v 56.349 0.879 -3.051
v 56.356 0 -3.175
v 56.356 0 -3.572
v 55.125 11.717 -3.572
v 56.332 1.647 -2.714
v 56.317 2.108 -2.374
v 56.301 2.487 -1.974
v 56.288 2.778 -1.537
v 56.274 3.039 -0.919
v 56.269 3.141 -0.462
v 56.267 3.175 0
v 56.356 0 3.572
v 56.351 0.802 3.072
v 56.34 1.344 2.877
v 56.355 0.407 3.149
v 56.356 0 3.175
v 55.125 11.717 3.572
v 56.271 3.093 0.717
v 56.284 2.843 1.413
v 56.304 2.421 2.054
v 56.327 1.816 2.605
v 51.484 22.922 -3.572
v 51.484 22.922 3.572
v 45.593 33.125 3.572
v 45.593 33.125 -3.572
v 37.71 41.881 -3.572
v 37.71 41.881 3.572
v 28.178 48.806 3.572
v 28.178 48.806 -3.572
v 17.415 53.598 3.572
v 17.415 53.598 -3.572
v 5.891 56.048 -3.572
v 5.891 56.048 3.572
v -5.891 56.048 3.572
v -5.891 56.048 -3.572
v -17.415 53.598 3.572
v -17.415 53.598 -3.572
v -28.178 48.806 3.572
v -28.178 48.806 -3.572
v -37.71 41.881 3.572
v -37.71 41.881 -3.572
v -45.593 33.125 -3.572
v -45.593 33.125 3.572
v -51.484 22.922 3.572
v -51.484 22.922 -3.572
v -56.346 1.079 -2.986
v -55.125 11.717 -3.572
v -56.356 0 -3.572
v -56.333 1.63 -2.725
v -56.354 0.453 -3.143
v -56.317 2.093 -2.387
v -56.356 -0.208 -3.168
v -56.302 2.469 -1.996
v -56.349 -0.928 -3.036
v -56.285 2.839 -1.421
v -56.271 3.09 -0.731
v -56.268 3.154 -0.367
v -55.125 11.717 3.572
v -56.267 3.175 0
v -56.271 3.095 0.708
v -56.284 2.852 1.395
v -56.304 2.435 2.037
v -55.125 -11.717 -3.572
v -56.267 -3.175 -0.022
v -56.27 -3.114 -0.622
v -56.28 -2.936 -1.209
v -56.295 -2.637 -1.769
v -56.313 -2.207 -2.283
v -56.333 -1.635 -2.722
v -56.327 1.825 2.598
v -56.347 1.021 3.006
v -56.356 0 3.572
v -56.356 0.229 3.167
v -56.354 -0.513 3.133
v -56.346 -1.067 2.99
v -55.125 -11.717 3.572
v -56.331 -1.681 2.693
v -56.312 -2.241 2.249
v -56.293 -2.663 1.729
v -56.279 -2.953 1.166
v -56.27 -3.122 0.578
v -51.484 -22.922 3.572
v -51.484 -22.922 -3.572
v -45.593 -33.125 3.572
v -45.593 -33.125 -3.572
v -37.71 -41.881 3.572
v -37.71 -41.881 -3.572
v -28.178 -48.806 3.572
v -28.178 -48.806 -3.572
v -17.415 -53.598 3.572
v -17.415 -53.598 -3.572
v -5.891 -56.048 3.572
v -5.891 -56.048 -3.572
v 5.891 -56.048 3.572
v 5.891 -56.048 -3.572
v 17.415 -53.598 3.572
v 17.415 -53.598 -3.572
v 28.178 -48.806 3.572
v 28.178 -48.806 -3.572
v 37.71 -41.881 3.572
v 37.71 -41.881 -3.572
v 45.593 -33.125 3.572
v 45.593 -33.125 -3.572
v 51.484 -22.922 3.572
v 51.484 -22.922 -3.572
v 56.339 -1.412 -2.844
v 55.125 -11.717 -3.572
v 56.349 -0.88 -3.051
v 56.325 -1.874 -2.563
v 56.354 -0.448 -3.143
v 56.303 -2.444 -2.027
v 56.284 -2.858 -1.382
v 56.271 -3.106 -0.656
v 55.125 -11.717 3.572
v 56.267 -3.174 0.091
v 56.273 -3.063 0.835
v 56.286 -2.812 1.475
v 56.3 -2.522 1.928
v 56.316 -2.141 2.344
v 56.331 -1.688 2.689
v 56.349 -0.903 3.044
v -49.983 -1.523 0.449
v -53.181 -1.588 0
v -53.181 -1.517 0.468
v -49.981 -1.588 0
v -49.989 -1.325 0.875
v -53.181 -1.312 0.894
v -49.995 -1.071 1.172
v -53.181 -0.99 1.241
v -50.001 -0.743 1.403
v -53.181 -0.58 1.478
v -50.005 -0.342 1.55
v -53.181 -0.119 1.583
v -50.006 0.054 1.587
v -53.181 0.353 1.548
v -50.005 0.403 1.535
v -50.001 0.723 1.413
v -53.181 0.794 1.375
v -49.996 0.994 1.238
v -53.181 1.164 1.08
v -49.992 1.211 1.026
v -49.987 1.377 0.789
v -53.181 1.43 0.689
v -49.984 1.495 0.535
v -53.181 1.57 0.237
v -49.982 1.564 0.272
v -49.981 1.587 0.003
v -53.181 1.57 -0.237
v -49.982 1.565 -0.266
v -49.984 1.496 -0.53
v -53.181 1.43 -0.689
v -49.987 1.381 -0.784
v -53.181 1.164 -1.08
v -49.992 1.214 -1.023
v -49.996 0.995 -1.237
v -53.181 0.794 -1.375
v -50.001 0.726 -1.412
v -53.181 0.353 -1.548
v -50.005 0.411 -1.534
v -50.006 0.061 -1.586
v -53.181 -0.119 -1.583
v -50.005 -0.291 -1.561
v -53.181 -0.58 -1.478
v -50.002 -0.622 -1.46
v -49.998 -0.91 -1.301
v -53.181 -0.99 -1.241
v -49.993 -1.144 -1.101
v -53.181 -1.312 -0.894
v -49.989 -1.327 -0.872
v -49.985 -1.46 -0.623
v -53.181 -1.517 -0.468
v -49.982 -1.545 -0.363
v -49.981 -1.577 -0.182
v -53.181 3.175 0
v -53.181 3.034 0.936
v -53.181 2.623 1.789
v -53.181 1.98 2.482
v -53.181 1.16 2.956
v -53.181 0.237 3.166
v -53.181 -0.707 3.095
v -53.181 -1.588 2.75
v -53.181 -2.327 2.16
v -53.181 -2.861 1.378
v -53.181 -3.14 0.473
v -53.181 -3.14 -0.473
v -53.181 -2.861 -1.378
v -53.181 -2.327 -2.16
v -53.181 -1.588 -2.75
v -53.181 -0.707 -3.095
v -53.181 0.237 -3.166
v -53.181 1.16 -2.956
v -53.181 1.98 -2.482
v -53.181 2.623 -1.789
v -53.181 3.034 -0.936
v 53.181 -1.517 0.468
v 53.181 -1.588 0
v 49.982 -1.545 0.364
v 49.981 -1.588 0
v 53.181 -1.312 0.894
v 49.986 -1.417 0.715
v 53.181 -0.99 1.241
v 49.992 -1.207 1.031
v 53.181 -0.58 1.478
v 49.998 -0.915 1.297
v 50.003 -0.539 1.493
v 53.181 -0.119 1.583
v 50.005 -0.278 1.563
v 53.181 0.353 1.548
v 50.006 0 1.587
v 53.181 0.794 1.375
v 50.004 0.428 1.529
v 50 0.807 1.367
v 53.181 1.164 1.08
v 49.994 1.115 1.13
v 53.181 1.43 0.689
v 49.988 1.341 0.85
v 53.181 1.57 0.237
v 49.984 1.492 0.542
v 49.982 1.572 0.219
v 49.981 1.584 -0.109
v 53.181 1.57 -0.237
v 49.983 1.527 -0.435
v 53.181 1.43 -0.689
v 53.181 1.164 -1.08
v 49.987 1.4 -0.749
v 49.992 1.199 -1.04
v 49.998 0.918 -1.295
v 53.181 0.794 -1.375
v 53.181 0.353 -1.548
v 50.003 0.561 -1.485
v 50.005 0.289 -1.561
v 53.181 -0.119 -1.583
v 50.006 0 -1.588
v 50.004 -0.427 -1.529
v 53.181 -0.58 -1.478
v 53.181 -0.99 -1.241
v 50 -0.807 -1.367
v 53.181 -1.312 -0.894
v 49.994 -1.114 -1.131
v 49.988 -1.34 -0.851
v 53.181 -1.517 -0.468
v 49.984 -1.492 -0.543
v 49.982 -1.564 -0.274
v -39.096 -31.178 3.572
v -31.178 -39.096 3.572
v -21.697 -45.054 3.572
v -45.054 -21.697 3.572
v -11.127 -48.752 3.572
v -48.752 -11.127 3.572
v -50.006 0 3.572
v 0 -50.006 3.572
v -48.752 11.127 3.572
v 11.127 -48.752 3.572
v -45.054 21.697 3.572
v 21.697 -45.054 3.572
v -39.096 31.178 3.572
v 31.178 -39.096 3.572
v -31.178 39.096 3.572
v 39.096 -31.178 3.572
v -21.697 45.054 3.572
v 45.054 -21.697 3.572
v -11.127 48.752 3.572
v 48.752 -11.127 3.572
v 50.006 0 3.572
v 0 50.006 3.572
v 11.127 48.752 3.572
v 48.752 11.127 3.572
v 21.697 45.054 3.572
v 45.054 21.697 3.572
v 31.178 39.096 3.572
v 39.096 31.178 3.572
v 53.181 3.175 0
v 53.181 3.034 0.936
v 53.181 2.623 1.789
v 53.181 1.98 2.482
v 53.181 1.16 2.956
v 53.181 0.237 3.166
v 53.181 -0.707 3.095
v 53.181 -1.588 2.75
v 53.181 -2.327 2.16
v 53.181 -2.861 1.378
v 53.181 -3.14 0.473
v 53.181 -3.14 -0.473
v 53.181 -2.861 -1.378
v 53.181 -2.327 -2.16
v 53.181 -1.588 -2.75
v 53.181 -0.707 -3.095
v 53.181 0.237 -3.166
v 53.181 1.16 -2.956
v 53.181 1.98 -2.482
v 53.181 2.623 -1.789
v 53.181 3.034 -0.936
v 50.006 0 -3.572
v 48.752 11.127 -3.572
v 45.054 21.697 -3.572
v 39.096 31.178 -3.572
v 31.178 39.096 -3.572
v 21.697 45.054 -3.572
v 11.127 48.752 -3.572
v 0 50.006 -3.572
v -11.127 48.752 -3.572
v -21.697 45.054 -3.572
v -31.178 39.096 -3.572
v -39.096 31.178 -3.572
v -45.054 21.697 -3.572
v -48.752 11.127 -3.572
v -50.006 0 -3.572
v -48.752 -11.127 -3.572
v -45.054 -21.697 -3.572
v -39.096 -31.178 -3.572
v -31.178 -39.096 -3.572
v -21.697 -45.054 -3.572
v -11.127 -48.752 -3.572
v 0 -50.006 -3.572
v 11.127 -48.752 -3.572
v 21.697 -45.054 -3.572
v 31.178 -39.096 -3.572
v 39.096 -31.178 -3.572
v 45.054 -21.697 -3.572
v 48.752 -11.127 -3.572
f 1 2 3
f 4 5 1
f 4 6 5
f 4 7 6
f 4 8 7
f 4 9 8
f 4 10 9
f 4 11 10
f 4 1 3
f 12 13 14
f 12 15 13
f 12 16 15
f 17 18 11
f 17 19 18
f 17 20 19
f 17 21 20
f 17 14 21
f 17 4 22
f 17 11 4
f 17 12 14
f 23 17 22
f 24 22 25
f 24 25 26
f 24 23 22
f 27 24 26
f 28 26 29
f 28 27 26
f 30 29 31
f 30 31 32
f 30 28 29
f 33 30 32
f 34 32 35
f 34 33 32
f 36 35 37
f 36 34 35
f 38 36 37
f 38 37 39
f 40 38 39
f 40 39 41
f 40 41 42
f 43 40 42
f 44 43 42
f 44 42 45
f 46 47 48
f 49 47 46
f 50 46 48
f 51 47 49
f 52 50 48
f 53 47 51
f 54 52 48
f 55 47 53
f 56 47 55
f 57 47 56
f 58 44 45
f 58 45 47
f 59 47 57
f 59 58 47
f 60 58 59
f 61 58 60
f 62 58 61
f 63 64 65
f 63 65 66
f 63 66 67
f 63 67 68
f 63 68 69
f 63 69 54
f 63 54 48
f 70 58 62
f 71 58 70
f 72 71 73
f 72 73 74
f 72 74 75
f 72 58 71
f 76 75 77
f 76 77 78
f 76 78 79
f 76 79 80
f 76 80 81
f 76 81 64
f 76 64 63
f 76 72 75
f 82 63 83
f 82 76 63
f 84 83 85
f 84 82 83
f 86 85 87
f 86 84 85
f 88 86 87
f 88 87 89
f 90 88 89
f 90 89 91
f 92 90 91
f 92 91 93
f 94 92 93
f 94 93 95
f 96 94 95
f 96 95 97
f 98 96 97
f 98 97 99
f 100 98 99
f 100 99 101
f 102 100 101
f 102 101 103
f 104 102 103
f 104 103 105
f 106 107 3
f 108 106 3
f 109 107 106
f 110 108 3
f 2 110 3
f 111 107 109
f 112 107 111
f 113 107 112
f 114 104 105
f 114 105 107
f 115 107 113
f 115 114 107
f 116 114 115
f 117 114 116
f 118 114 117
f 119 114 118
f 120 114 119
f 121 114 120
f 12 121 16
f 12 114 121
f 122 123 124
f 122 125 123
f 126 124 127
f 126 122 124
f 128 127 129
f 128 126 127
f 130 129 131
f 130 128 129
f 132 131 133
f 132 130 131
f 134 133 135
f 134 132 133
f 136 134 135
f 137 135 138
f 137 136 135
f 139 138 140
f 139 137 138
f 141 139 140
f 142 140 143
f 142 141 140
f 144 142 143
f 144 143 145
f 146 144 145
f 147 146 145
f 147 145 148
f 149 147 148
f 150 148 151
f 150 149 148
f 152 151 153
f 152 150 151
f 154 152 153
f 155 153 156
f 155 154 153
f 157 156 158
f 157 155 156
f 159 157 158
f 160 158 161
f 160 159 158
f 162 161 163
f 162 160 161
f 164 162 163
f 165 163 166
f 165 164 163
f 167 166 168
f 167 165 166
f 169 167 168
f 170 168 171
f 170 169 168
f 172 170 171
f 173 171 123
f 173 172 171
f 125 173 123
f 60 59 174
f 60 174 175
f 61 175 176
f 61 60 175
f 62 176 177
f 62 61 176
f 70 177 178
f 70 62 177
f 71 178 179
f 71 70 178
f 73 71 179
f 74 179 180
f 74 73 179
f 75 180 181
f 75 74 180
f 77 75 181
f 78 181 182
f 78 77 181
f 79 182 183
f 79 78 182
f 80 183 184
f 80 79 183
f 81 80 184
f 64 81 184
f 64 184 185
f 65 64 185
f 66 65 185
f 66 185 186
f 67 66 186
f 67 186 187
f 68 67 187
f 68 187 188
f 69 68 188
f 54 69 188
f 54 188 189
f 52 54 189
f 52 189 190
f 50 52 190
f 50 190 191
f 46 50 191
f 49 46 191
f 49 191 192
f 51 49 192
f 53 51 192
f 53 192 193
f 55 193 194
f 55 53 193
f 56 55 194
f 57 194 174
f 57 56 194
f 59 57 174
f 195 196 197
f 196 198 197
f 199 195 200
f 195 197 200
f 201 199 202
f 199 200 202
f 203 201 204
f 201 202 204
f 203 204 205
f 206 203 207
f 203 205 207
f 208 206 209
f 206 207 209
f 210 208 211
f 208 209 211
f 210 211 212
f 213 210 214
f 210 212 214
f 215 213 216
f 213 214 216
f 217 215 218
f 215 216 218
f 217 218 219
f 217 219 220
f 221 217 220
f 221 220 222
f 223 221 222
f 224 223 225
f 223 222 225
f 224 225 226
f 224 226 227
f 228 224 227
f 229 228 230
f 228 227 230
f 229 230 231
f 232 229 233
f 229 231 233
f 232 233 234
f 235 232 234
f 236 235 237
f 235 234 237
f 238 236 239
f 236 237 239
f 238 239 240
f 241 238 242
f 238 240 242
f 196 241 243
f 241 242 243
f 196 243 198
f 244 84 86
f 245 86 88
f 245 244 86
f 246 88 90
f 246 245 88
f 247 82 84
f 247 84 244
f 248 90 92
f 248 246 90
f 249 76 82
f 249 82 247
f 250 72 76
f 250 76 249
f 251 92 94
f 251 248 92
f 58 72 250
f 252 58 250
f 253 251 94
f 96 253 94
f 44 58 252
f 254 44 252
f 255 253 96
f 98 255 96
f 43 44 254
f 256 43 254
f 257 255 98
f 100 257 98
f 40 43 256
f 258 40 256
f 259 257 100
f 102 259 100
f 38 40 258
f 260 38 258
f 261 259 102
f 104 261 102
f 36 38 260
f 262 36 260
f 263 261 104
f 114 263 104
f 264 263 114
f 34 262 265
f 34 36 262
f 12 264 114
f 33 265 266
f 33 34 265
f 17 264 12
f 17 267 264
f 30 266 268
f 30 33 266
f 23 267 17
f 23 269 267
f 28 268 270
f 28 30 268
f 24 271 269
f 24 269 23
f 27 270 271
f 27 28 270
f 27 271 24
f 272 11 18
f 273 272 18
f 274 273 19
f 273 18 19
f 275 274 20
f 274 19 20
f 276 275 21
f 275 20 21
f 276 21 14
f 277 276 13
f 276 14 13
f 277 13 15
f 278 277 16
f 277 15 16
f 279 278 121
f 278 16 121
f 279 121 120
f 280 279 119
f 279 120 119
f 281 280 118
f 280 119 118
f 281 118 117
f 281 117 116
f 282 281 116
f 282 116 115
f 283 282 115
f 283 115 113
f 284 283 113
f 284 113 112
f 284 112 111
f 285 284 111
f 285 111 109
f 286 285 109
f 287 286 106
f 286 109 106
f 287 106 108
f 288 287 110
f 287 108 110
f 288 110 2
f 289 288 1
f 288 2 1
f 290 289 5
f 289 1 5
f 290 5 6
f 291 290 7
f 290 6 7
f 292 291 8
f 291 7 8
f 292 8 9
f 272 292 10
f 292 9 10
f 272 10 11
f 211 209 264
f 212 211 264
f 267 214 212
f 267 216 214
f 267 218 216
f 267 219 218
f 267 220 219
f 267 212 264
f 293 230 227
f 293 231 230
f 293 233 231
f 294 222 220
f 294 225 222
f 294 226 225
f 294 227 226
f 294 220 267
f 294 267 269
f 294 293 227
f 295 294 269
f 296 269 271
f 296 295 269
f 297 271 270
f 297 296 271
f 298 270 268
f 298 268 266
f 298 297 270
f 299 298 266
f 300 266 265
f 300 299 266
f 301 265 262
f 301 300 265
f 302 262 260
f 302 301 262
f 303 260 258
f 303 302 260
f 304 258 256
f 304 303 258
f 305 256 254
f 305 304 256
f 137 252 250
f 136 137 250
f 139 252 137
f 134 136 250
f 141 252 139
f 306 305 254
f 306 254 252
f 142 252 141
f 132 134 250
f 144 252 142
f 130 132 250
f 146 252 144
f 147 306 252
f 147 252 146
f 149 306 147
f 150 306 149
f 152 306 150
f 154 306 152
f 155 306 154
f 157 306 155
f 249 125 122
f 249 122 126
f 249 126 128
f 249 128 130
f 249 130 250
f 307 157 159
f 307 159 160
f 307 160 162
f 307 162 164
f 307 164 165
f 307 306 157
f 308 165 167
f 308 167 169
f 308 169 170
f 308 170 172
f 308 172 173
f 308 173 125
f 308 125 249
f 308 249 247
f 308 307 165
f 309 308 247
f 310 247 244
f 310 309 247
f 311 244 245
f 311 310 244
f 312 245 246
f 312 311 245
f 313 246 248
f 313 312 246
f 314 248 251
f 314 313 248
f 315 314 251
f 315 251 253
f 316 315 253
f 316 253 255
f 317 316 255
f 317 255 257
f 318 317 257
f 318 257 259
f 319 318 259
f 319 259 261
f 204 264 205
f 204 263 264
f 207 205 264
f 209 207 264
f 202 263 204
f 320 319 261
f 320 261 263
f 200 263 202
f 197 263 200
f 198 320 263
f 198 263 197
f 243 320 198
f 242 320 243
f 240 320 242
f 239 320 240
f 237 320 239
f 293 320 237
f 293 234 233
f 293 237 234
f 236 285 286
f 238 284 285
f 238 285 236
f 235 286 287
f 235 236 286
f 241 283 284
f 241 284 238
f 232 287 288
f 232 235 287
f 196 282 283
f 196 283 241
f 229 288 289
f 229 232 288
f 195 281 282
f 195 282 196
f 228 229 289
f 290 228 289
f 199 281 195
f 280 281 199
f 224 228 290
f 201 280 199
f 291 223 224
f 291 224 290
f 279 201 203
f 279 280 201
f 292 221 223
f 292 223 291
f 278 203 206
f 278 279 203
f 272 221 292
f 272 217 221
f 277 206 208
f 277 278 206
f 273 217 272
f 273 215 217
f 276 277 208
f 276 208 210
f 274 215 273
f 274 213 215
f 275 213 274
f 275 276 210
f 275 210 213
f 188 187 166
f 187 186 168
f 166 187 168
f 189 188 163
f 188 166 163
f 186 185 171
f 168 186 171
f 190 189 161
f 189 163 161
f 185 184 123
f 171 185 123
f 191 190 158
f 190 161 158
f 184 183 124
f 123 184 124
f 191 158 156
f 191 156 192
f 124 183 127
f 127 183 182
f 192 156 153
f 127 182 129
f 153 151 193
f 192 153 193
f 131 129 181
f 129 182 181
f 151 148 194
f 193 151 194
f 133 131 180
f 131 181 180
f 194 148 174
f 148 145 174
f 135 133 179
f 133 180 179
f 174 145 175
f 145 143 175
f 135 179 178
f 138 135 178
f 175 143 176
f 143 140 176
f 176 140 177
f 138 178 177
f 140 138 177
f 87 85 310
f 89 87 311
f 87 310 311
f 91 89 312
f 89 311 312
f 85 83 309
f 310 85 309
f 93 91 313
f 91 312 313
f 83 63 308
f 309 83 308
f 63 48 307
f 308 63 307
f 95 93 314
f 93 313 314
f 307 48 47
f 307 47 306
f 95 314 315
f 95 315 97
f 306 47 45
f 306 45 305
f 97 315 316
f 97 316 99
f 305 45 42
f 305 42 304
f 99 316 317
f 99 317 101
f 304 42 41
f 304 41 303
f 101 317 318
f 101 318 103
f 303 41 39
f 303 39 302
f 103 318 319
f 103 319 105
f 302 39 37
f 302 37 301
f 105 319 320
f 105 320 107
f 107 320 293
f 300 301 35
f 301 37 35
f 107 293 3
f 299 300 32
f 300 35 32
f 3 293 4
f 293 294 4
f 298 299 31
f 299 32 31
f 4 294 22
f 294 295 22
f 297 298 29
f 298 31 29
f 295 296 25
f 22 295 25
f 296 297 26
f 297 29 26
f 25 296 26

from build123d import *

# Parameters (mm, degrees)
SKETCH1_R           = 56.35625
SKETCH1_R_2         = 50.00625
BOSS_EXTRUDE1_DEPTH = 3.571875
HOLE1_D             = 3.175
HOLE1_DEPTH         = 12.7
HOLE1_CBORE_D       = 6.35
HOLE1_CBORE_DEPTH   = 3.175


with BuildPart() as part:
    # Sketch1 → Boss-Extrude1 (new body, symmetric)
    with BuildSketch(Plane.XY):
        Circle(SKETCH1_R)
        Circle(SKETCH1_R_2, mode=Mode.SUBTRACT)
    extrude(amount=BOSS_EXTRUDE1_DEPTH, both=True)

    # Hole1
    with Locations(Plane.YZ.offset(56.35625)):
        with Locations((0, 0)):
            hole1 = CounterBoreHole(HOLE1_D / 2, HOLE1_CBORE_D / 2, HOLE1_CBORE_DEPTH, depth=HOLE1_DEPTH)

    # Mirror1: Hole1 across plane
    add(hole1.mirror(Plane(origin=(0, 0, 0), x_dir=(0, 0, 1), z_dir=(1, 0, 0))), mode=Mode.SUBTRACT)


solid = part.part
